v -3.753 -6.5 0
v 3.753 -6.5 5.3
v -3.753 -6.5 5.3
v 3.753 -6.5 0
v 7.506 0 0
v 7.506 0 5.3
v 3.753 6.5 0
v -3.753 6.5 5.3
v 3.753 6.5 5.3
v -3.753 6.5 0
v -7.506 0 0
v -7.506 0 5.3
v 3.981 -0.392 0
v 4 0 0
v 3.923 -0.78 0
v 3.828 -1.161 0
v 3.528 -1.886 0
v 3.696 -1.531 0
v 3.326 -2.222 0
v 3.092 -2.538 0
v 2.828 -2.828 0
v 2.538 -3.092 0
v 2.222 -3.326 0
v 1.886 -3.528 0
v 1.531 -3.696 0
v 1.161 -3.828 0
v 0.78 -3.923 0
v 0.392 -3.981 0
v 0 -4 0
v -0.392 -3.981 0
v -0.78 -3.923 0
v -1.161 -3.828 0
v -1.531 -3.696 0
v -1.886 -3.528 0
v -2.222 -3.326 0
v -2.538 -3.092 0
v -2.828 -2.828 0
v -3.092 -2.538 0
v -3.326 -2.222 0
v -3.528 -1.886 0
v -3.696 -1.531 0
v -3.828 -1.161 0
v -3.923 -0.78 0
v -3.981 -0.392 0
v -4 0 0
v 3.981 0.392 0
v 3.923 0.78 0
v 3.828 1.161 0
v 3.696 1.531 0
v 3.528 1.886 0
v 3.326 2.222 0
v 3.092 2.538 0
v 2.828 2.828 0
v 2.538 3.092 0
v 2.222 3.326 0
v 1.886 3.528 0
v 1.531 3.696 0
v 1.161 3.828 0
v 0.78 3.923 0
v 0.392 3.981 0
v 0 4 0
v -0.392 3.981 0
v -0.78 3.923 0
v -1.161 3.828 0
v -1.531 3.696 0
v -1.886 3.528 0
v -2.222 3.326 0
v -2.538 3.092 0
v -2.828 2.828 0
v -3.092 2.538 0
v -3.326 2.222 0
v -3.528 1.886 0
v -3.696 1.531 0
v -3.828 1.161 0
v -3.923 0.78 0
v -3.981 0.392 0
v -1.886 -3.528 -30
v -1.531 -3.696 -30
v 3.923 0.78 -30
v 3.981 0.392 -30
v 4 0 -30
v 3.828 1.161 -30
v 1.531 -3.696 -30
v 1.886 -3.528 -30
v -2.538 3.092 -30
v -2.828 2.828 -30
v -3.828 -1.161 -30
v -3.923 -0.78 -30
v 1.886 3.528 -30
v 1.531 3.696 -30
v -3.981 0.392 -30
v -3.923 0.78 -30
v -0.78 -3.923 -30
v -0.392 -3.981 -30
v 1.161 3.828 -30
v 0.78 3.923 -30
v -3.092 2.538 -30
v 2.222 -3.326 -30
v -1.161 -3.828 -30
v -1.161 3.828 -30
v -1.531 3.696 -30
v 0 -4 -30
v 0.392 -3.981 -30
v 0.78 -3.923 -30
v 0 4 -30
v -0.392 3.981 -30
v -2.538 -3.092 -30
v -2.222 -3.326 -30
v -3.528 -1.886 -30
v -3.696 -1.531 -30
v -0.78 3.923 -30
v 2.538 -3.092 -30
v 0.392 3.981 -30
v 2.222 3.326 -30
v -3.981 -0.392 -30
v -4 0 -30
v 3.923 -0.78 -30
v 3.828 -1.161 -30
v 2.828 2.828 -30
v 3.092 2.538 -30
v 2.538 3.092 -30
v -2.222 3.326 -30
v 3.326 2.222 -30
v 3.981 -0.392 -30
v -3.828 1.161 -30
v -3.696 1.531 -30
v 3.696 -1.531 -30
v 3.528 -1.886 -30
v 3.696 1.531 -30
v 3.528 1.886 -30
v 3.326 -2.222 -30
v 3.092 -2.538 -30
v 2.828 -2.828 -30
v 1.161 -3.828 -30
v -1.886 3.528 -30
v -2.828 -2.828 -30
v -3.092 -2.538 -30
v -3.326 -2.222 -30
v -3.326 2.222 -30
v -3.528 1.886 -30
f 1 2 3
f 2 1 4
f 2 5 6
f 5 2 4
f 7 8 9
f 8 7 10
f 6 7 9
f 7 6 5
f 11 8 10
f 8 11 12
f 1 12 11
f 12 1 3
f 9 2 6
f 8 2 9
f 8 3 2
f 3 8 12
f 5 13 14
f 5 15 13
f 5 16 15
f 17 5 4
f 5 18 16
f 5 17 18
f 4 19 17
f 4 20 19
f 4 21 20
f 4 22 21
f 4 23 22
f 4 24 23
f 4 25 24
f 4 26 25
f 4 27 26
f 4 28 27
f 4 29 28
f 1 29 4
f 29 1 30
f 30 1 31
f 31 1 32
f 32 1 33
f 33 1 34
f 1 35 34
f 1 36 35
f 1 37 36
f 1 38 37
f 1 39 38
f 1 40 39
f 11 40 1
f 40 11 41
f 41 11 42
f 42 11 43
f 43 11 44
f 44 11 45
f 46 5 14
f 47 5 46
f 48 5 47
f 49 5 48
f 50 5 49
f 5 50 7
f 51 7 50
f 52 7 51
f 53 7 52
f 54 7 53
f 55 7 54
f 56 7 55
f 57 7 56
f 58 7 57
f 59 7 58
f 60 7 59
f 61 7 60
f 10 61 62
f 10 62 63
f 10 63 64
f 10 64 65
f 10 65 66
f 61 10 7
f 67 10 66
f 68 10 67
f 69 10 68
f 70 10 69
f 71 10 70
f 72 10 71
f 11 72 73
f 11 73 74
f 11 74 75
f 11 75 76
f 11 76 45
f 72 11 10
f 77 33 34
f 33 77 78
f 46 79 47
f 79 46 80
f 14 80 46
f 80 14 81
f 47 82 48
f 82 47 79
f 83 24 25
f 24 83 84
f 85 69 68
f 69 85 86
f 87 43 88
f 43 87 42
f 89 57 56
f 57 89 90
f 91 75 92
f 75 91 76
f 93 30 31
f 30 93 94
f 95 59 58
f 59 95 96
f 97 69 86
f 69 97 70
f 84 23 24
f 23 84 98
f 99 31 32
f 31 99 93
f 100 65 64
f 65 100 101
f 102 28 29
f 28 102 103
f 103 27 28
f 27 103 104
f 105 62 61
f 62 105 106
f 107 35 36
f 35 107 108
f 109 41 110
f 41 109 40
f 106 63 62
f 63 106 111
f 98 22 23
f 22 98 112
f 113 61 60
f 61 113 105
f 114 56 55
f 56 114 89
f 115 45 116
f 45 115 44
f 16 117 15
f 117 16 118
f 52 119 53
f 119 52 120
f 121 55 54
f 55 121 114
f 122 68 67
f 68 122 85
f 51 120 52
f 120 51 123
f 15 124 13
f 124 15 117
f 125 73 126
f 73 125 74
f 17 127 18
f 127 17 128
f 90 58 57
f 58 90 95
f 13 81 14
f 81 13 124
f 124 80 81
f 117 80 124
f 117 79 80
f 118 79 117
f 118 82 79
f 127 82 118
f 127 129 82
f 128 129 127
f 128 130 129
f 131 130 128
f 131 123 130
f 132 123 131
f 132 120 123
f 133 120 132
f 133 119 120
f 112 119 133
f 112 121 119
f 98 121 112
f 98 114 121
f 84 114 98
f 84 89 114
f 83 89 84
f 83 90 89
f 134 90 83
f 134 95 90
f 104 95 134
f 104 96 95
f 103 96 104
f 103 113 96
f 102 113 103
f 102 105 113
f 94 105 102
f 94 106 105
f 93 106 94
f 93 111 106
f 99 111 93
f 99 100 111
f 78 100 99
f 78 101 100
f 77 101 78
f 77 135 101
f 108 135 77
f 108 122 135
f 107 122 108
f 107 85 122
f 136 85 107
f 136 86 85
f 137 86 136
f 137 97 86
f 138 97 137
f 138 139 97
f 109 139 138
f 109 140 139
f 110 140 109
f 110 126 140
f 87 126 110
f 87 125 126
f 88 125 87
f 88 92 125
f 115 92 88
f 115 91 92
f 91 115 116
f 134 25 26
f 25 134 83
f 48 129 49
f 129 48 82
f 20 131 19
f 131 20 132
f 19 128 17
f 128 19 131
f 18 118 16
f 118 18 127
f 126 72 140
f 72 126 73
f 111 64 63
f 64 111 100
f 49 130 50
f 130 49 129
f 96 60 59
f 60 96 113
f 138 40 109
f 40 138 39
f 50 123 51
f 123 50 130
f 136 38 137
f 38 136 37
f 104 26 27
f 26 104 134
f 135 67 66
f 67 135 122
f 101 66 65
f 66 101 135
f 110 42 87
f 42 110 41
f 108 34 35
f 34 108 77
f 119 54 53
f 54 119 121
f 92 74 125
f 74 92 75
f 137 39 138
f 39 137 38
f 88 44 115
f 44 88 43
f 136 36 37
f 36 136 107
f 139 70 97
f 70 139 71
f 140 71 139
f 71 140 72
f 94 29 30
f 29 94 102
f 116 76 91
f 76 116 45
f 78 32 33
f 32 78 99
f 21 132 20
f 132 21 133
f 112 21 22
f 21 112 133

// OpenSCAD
$fn = 64;

head_af = 13;
head_height = 5.3;
shank_diameter = 8;
shank_length = 30;

union() {
    cylinder(
        h = head_height,
        r = head_af / sqrt(3),
        $fn = 6
    );

    translate([0, 0, -shank_length])
        cylinder(
            h = shank_length,
            d = shank_diameter
        );
}
